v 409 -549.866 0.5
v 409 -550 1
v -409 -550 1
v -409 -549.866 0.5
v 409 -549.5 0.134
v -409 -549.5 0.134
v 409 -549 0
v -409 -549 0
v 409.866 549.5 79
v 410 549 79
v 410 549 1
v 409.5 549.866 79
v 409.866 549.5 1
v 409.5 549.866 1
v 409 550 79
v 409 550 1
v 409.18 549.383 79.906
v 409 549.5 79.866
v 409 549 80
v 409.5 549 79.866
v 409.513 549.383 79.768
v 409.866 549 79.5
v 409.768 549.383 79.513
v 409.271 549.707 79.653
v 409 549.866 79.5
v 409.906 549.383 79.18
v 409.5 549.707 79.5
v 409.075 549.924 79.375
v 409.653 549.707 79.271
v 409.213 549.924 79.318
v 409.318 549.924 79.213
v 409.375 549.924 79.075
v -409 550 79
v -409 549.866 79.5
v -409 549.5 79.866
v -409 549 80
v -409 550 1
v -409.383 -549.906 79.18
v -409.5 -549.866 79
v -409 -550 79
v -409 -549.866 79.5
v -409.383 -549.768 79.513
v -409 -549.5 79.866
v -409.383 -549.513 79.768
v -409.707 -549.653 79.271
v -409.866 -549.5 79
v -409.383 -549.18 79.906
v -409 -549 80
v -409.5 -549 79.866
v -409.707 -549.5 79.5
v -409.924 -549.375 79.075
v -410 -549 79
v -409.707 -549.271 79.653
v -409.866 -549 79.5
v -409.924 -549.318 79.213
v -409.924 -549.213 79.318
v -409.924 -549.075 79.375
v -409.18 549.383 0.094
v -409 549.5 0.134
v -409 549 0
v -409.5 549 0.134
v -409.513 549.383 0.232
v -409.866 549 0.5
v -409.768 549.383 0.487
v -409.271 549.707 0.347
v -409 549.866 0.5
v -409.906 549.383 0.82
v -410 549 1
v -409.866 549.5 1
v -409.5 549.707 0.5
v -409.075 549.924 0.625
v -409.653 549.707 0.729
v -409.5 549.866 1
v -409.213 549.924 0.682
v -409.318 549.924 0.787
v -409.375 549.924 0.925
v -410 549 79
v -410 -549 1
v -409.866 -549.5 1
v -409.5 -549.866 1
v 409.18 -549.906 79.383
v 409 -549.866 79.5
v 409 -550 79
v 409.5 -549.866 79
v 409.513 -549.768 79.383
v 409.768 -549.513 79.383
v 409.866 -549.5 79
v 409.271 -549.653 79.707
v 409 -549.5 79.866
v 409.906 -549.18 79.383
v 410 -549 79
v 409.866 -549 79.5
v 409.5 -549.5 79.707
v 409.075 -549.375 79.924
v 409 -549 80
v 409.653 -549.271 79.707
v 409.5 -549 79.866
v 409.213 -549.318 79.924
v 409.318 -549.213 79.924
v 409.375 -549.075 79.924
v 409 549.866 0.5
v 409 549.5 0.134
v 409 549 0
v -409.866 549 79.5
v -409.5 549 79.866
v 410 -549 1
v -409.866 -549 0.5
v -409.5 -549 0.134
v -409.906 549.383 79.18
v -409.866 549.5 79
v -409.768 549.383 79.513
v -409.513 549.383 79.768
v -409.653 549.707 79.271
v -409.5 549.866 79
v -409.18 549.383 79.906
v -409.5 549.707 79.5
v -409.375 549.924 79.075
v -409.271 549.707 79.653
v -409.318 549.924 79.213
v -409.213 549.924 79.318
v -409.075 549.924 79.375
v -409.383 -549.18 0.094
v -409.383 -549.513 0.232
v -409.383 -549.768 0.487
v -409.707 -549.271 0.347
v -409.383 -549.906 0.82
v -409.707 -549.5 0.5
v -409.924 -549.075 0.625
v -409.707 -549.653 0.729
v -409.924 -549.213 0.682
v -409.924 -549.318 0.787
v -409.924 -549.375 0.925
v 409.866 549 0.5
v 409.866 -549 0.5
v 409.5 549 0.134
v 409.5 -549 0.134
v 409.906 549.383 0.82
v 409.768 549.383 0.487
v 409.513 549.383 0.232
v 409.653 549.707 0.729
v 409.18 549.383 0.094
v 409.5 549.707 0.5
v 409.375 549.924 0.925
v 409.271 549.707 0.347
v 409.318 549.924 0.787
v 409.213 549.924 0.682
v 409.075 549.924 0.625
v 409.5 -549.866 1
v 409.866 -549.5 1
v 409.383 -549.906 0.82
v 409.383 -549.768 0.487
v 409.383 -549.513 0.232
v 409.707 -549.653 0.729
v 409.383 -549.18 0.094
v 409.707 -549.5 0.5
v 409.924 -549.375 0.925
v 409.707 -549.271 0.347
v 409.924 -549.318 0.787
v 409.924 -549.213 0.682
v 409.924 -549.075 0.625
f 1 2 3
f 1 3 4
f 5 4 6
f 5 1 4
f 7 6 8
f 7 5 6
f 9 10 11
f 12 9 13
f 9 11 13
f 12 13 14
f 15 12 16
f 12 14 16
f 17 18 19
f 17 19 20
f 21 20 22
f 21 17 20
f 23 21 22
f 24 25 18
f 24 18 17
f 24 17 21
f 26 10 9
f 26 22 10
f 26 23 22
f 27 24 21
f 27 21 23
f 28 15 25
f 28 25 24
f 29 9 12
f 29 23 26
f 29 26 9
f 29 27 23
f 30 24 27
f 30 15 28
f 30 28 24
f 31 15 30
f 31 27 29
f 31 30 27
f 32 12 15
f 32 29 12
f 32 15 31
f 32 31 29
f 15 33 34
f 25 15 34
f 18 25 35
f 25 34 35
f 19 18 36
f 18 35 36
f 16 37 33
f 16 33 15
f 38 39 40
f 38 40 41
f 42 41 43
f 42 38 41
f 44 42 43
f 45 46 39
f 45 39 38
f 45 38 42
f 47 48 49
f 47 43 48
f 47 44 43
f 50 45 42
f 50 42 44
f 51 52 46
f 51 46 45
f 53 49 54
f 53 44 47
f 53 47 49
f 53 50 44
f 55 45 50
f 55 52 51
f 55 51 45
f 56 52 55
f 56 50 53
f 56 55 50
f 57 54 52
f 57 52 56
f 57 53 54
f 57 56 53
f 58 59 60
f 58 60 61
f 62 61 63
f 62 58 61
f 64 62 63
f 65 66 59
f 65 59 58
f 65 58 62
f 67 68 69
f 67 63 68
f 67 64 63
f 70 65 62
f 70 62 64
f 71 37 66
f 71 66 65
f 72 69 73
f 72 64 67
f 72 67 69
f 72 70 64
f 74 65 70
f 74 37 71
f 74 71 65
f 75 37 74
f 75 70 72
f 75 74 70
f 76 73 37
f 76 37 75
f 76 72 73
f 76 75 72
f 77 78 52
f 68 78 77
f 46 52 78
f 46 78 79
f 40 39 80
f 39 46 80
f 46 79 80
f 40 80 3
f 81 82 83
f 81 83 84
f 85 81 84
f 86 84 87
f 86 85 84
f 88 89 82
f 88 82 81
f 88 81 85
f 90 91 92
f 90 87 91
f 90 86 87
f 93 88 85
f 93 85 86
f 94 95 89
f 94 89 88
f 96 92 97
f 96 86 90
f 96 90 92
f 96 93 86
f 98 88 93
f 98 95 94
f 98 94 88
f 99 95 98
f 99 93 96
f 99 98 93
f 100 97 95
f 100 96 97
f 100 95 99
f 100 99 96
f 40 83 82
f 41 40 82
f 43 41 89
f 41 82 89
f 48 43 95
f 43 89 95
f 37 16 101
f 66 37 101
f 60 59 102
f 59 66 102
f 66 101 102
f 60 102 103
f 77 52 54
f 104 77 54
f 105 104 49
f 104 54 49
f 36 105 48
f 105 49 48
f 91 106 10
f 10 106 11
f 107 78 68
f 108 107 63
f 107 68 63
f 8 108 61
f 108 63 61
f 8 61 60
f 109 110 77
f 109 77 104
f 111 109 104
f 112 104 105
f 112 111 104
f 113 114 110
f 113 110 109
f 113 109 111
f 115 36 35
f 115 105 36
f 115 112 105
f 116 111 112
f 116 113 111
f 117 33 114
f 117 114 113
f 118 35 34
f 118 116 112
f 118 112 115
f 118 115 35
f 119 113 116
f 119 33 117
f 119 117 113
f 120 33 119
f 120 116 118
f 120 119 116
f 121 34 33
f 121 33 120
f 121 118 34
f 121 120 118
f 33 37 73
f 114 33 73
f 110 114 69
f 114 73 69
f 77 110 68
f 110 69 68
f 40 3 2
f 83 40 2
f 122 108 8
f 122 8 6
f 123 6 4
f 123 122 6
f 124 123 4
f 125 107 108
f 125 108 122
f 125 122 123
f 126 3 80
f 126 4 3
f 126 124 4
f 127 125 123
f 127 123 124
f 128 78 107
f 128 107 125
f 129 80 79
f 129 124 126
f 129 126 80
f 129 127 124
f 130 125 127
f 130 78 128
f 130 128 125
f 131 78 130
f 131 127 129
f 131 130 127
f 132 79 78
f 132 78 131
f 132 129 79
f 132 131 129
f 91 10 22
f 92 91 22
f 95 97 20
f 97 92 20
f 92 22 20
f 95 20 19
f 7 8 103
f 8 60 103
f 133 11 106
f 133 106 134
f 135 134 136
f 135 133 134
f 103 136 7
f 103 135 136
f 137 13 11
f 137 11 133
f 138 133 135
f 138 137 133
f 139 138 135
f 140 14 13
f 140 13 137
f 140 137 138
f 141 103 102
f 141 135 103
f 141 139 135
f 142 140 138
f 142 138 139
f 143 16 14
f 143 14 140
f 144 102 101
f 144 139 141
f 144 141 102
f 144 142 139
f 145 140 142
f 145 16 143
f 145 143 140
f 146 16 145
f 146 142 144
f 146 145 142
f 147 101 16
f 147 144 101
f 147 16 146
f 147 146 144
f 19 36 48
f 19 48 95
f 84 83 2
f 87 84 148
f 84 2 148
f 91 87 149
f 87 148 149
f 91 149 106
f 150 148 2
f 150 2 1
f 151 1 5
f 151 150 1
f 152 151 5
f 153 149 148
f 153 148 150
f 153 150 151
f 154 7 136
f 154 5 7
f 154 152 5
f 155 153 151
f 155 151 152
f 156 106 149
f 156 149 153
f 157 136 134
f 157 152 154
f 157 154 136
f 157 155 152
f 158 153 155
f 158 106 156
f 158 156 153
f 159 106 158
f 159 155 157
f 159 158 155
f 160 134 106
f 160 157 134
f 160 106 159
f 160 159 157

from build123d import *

# Parameters (mm, degrees)
SKETCH_1_W      = 820
SKETCH_1_H      = 1100
EXTRUDE_1_DEPTH = 80
FILLET_1_R      = 1
FILLET_2_R      = 1


with BuildPart() as part:
    # Эскиз1 → Бобышка-Вытянуть1 (new body)
    with BuildSketch(Plane.XY):
        Rectangle(SKETCH_1_W, SKETCH_1_H)
    extrude(amount=EXTRUDE_1_DEPTH)

    # Скругление1
    fillet_1_edges = [part.edges().sort_by_distance(p)[0] for p in [
        (0, -550, 0),
        (-410, 0, 0),
        (0, 550, 0),
        (410, 0, 0),
    ]]
    fillet(fillet_1_edges, radius=FILLET_1_R)

    # Скругление2
    # the kernel refuses this fillet: 1 mm, written as the material it takes off along each edge
    with BuildSketch(Plane(origin=(409, -549, 1), x_dir=(0, -1, 0), z_dir=(1, 0, 0))) as fillet_2_piece_1_section:
        Polygon((0, 0), (FILLET_2_R, 0), (FILLET_2_R, FILLET_2_R), (0, FILLET_2_R), align=None)
    fillet_2_piece_1 = extrude(amount=FILLET_2_R, mode=Mode.PRIVATE)
    fillet_2_piece_1 = fillet_2_piece_1 - Plane(origin=(409, -549, 1), x_dir=(0, 0.7071067811865475, 0.7071067811865475), z_dir=(1, 0, 0)) * Sphere(FILLET_2_R, mode=Mode.PRIVATE)
    add(fillet_2_piece_1, mode=Mode.SUBTRACT)
    with BuildSketch(Plane(origin=(-409, -549, 1), x_dir=(0, -1, 0), z_dir=(-1, 0, 0))) as fillet_2_piece_2_section:
        Polygon((0, 0), (FILLET_2_R, 0), (FILLET_2_R, -FILLET_2_R), (0, -FILLET_2_R), align=None)
    fillet_2_piece_2 = extrude(amount=FILLET_2_R, mode=Mode.PRIVATE)
    fillet_2_piece_2 = fillet_2_piece_2 - Plane(origin=(-409, -549, 1), x_dir=(0, 0.7071067811865475, 0.7071067811865475), z_dir=(-1, 0, 0)) * Sphere(FILLET_2_R, mode=Mode.PRIVATE)
    add(fillet_2_piece_2, mode=Mode.SUBTRACT)
    with BuildSketch(Plane(origin=(409, 549, 1), x_dir=(1, 0, 0), z_dir=(0, 1, 0))) as fillet_2_piece_3_section:
        Polygon((0, 0), (FILLET_2_R, 0), (FILLET_2_R, FILLET_2_R), (0, FILLET_2_R), align=None)
    fillet_2_piece_3 = extrude(amount=FILLET_2_R, mode=Mode.PRIVATE)
    fillet_2_piece_3 = fillet_2_piece_3 - Plane(origin=(409, 549, 1), x_dir=(-0.7071067811865475, 0, 0.7071067811865475), z_dir=(0, 1, 0)) * Sphere(FILLET_2_R, mode=Mode.PRIVATE)
    add(fillet_2_piece_3, mode=Mode.SUBTRACT)
    with BuildSketch(Plane(origin=(-409, 549, 1), x_dir=(-1, 0, 0), z_dir=(0, 1, 0))) as fillet_2_piece_4_section:
        Polygon((0, 0), (FILLET_2_R, 0), (FILLET_2_R, -FILLET_2_R), (0, -FILLET_2_R), align=None)
    fillet_2_piece_4 = extrude(amount=FILLET_2_R, mode=Mode.PRIVATE)
    fillet_2_piece_4 = fillet_2_piece_4 - Plane(origin=(-409, 549, 1), x_dir=(0.7071067811865475, 0, 0.7071067811865475), z_dir=(0, 1, 0)) * Sphere(FILLET_2_R, mode=Mode.PRIVATE)
    add(fillet_2_piece_4, mode=Mode.SUBTRACT)
    with BuildSketch(Plane(origin=(-409, -549, 79), x_dir=(0, 0, 1), z_dir=(-1, 0, 0))) as fillet_2_piece_5_section:
        Polygon((0, 0), (FILLET_2_R, 0), (FILLET_2_R, -FILLET_2_R), (0, -FILLET_2_R), align=None)
    fillet_2_piece_5 = extrude(amount=FILLET_2_R, mode=Mode.PRIVATE)
    fillet_2_piece_5 = fillet_2_piece_5 - Plane(origin=(-409, -549, 79), x_dir=(0, 0.7071067811865475, -0.7071067811865475), z_dir=(-1, 0, 0)) * Sphere(FILLET_2_R, mode=Mode.PRIVATE)
    add(fillet_2_piece_5, mode=Mode.SUBTRACT)
    with BuildSketch(Plane(origin=(-409, 549, 79), x_dir=(-1, 0, 0), z_dir=(0, 1, 0))) as fillet_2_piece_6_section:
        Polygon((0, 0), (FILLET_2_R, 0), (FILLET_2_R, FILLET_2_R), (0, FILLET_2_R), align=None)
    fillet_2_piece_6 = extrude(amount=FILLET_2_R, mode=Mode.PRIVATE)
    fillet_2_piece_6 = fillet_2_piece_6 - Plane(origin=(-409, 549, 79), x_dir=(0.7071067811865475, 0, -0.7071067811865475), z_dir=(0, 1, 0)) * Sphere(FILLET_2_R, mode=Mode.PRIVATE)
    add(fillet_2_piece_6, mode=Mode.SUBTRACT)
    with BuildSketch(Plane(origin=(409, -549, 79), x_dir=(1, 0, 0), z_dir=(0, 0, 1))) as fillet_2_piece_7_section:
        Polygon((0, 0), (FILLET_2_R, 0), (FILLET_2_R, -FILLET_2_R), (0, -FILLET_2_R), align=None)
    fillet_2_piece_7 = extrude(amount=FILLET_2_R, mode=Mode.PRIVATE)
    fillet_2_piece_7 = fillet_2_piece_7 - Plane(origin=(409, -549, 79), x_dir=(-0.7071067811865476, 0.7071067811865475, 0), z_dir=(0, 0, 1)) * Sphere(FILLET_2_R, mode=Mode.PRIVATE)
    add(fillet_2_piece_7, mode=Mode.SUBTRACT)
    with BuildSketch(Plane(origin=(409, 549, 79), x_dir=(0, 0, 1), z_dir=(0, 1, 0))) as fillet_2_piece_8_section:
        Polygon((0, 0), (FILLET_2_R, 0), (FILLET_2_R, FILLET_2_R), (0, FILLET_2_R), align=None)
    fillet_2_piece_8 = extrude(amount=FILLET_2_R, mode=Mode.PRIVATE)
    fillet_2_piece_8 = fillet_2_piece_8 - Plane(origin=(409, 549, 79), x_dir=(-0.7071067811865475, 0, -0.7071067811865475), z_dir=(0, 1, 0)) * Sphere(FILLET_2_R, mode=Mode.PRIVATE)
    add(fillet_2_piece_8, mode=Mode.SUBTRACT)
    with BuildSketch(Plane(origin=(-410, -549, 80), x_dir=(0, 0, -1), z_dir=(0, 1, 0))) as fillet_2_piece_9:
        with BuildLine():
            CenterArc((FILLET_2_R, -FILLET_2_R), FILLET_2_R, 90, 90)
            Line((0, -FILLET_2_R), (0, 0))
            Line((0, 0), (FILLET_2_R, 0))
        make_face()
    extrude(amount=1098, mode=Mode.SUBTRACT)
    with BuildSketch(Plane(origin=(409, -550, 80), x_dir=(0, 1, 0), z_dir=(-1, 0, 0))) as fillet_2_piece_10:
        with BuildLine():
            CenterArc((FILLET_2_R, FILLET_2_R), FILLET_2_R, 180, 90)
            Line((0, FILLET_2_R), (0, 0))
            Line((0, 0), (FILLET_2_R, 0))
        make_face()
    extrude(amount=818, mode=Mode.SUBTRACT)
    with BuildSketch(Plane(origin=(410, 549, 80), x_dir=(-1, 0, 0), z_dir=(0, -1, 0))) as fillet_2_piece_11:
        with BuildLine():
            CenterArc((FILLET_2_R, FILLET_2_R), FILLET_2_R, 180, 90)
            Line((0, FILLET_2_R), (0, 0))
            Line((0, 0), (FILLET_2_R, 0))
        make_face()
    extrude(amount=1098, mode=Mode.SUBTRACT)
    with BuildSketch(Plane(origin=(-409, 550, 80), x_dir=(0, 0, -1), z_dir=(1, 0, 0))) as fillet_2_piece_12:
        with BuildLine():
            CenterArc((FILLET_2_R, -FILLET_2_R), FILLET_2_R, 90, 90)
            Line((0, -FILLET_2_R), (0, 0))
            Line((0, 0), (FILLET_2_R, 0))
        make_face()
    extrude(amount=818, mode=Mode.SUBTRACT)
    with BuildSketch(Plane(origin=(410, -550, 1), x_dir=(0, 1, 0), z_dir=(0, 0, 1)), Plane(origin=(410, 550, 1), x_dir=(-1, 0, 0), z_dir=(0, 0, 1))) as fillet_2_piece_13:
        with BuildLine():
            CenterArc((FILLET_2_R, FILLET_2_R), FILLET_2_R, 180, 90)
            Line((0, FILLET_2_R), (0, 0))
            Line((0, 0), (FILLET_2_R, 0))
        make_face()
    extrude(amount=78, mode=Mode.SUBTRACT)
    with BuildSketch(Plane(origin=(-410, -550, 1), x_dir=(0, 1, 0), z_dir=(0, 0, 1)), Plane(origin=(-410, 550, 1), x_dir=(1, 0, 0), z_dir=(0, 0, 1))) as fillet_2_piece_14:
        with BuildLine():
            CenterArc((FILLET_2_R, -FILLET_2_R), FILLET_2_R, 90, 90)
            Line((0, -FILLET_2_R), (0, 0))
            Line((0, 0), (FILLET_2_R, 0))
        make_face()
    extrude(amount=78, mode=Mode.SUBTRACT)


solid = part.part
